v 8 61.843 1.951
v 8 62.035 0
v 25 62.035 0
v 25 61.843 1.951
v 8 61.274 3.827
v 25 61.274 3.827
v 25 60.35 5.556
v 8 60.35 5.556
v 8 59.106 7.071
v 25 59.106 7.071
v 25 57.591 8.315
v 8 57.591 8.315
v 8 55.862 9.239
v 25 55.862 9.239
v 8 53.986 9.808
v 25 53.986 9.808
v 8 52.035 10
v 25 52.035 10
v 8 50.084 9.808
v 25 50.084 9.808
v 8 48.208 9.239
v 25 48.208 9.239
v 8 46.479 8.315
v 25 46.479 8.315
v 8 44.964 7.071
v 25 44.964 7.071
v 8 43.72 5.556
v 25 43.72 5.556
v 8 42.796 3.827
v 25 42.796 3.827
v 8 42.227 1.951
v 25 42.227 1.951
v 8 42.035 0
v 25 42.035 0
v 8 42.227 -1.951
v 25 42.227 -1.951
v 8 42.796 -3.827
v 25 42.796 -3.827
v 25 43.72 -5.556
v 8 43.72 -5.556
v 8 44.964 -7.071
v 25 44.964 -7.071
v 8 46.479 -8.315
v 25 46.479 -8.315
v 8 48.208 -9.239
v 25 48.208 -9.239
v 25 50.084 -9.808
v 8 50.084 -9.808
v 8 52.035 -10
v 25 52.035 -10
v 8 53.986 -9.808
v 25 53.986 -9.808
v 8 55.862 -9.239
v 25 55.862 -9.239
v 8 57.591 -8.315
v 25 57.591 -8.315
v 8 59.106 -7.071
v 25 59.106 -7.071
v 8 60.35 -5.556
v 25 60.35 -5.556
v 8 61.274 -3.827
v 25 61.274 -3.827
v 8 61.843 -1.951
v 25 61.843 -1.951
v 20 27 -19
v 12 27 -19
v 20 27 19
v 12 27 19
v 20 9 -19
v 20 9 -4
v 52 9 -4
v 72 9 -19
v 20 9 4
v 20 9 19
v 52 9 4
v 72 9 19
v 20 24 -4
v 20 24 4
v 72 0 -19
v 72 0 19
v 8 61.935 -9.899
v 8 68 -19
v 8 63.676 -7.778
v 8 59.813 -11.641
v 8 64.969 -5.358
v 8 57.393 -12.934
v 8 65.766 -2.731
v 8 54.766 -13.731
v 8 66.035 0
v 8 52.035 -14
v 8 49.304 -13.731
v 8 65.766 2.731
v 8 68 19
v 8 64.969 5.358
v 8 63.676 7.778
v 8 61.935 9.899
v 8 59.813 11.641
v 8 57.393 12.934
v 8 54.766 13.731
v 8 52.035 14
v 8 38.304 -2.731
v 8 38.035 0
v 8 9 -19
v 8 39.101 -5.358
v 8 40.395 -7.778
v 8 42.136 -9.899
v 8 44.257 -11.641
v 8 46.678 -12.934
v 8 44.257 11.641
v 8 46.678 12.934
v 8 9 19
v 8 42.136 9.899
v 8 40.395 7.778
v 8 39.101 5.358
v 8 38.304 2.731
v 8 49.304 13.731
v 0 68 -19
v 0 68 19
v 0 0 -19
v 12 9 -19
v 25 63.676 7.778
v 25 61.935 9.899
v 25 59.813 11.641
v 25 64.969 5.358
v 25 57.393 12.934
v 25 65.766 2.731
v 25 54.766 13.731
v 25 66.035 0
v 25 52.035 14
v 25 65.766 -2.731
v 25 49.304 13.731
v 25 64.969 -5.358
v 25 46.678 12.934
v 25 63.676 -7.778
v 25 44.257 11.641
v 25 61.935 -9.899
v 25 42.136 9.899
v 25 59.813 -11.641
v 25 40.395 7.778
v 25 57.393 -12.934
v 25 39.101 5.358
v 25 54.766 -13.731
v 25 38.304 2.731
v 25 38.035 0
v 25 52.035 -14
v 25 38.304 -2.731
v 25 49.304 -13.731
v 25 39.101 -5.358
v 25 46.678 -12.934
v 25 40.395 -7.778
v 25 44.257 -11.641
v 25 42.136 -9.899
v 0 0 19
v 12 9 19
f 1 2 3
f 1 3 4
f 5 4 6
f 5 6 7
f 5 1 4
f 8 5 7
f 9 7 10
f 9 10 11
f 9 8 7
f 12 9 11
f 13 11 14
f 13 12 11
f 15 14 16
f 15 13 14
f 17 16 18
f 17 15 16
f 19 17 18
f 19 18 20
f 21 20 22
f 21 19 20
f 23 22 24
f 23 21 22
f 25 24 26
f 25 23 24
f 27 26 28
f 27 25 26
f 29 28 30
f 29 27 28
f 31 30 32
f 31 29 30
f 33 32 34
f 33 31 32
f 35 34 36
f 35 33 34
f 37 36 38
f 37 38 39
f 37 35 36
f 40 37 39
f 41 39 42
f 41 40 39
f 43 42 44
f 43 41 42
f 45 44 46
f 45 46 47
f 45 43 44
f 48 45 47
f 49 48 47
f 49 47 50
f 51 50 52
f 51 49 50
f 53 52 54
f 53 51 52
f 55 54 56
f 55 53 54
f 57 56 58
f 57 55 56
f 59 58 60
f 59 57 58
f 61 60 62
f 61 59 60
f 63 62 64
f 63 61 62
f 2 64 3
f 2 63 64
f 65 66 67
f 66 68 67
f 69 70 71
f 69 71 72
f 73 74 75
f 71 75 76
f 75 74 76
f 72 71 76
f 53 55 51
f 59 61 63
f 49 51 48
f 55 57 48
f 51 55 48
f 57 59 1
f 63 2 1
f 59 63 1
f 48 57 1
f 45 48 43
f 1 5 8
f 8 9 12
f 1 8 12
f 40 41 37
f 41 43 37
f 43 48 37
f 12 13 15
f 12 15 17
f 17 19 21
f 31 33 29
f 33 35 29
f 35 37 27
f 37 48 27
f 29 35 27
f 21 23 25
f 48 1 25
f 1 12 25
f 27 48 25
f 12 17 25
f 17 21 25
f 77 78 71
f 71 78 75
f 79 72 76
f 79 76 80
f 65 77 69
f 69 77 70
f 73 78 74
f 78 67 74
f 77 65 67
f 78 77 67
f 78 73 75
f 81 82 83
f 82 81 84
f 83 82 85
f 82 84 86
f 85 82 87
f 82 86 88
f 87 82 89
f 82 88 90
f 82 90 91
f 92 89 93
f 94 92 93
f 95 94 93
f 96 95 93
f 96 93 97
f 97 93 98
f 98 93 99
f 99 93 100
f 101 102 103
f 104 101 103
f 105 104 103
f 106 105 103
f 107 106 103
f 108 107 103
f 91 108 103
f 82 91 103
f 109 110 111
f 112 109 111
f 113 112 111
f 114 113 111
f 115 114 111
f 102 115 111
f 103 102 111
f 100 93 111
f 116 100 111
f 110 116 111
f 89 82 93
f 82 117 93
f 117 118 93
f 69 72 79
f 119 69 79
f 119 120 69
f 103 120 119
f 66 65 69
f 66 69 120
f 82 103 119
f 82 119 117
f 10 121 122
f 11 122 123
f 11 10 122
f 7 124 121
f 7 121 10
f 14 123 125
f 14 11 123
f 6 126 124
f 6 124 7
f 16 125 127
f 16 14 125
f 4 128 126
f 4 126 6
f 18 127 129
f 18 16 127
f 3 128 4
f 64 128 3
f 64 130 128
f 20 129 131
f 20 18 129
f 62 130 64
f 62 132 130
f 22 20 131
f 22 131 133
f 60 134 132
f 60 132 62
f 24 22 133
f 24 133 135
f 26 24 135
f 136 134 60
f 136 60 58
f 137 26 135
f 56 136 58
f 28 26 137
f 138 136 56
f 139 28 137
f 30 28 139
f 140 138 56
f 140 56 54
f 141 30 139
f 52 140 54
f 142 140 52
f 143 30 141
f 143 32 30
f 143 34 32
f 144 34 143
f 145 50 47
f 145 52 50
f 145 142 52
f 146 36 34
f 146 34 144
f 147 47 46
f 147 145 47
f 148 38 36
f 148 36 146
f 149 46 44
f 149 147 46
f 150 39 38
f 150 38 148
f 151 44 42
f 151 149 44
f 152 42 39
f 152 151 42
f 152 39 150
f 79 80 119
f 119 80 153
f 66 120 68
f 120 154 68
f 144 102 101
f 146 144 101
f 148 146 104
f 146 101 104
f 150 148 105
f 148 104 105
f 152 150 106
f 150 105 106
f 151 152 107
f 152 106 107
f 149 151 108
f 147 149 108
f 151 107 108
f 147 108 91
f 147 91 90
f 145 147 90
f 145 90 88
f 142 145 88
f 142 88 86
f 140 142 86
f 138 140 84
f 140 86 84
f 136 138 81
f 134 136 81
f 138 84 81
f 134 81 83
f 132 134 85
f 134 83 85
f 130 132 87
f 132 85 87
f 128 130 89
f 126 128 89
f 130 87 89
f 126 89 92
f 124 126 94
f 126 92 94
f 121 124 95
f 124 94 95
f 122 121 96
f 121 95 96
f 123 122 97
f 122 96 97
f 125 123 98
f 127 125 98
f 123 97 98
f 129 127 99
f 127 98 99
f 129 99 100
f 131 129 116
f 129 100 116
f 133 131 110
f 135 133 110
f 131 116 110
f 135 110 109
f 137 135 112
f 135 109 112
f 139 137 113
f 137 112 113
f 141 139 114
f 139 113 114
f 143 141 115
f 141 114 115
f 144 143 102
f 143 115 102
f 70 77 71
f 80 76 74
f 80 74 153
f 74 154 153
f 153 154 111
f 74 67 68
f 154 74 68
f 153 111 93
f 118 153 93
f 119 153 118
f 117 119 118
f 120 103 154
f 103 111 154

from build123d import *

# Parameters (mm, degrees)
SALIENTE_EXTRUIR2_DEPTH = 19
SALIENTE_EXTRUIR3_DEPTH = 32
CORTAR_EXTRUIR1_DEPTH   = 102.671038157
CROQUIS5_R              = 14
CROQUIS5_R_2            = 10
SALIENTE_EXTRUIR4_DEPTH = 17


with BuildPart() as part:
    # Croquis1 → Saliente-Extruir2 (new, symmetric)
    with BuildSketch(Plane.XY):
        Polygon((0, 0), (0, 68), (8, 68), (8, 9), (12, 9), (12, 27), (20, 27), (20, 9), (72, 9), (72, 0), align=None)
    extrude(amount=SALIENTE_EXTRUIR2_DEPTH, both=True)

    # Croquis3 → Saliente-Extruir3 (add)
    with BuildSketch(Plane(origin=(20, 0, 0), x_dir=(0, 0, -1), z_dir=(1, 0, 0))):
        Polygon((0, 9), (-4, 9), (-4, 24), (4, 24), (4, 9), align=None)
    extrude(amount=SALIENTE_EXTRUIR3_DEPTH)

    # Croquis4 → Cortar-Extruir1 (cut, through all)
    with BuildSketch(Plane.XY.offset(4)):
        Polygon((20, 24), (52, 9), (52, 24), align=None)
    extrude(amount=-CORTAR_EXTRUIR1_DEPTH, mode=Mode.SUBTRACT)

    # Croquis5 → Saliente-Extruir4 (add)
    with BuildSketch(Plane(origin=(8, 0, 0), x_dir=(0, 0, -1), z_dir=(1, 0, 0))):
        with Locations(Location((0, 52.035144158, 0), (0, 0, 270))):
            Circle(CROQUIS5_R)
        with Locations(Location((0, 52.035144158, 0), (0, 0, 90))):
            Circle(CROQUIS5_R_2, mode=Mode.SUBTRACT)
    extrude(amount=SALIENTE_EXTRUIR4_DEPTH)


solid = part.part
